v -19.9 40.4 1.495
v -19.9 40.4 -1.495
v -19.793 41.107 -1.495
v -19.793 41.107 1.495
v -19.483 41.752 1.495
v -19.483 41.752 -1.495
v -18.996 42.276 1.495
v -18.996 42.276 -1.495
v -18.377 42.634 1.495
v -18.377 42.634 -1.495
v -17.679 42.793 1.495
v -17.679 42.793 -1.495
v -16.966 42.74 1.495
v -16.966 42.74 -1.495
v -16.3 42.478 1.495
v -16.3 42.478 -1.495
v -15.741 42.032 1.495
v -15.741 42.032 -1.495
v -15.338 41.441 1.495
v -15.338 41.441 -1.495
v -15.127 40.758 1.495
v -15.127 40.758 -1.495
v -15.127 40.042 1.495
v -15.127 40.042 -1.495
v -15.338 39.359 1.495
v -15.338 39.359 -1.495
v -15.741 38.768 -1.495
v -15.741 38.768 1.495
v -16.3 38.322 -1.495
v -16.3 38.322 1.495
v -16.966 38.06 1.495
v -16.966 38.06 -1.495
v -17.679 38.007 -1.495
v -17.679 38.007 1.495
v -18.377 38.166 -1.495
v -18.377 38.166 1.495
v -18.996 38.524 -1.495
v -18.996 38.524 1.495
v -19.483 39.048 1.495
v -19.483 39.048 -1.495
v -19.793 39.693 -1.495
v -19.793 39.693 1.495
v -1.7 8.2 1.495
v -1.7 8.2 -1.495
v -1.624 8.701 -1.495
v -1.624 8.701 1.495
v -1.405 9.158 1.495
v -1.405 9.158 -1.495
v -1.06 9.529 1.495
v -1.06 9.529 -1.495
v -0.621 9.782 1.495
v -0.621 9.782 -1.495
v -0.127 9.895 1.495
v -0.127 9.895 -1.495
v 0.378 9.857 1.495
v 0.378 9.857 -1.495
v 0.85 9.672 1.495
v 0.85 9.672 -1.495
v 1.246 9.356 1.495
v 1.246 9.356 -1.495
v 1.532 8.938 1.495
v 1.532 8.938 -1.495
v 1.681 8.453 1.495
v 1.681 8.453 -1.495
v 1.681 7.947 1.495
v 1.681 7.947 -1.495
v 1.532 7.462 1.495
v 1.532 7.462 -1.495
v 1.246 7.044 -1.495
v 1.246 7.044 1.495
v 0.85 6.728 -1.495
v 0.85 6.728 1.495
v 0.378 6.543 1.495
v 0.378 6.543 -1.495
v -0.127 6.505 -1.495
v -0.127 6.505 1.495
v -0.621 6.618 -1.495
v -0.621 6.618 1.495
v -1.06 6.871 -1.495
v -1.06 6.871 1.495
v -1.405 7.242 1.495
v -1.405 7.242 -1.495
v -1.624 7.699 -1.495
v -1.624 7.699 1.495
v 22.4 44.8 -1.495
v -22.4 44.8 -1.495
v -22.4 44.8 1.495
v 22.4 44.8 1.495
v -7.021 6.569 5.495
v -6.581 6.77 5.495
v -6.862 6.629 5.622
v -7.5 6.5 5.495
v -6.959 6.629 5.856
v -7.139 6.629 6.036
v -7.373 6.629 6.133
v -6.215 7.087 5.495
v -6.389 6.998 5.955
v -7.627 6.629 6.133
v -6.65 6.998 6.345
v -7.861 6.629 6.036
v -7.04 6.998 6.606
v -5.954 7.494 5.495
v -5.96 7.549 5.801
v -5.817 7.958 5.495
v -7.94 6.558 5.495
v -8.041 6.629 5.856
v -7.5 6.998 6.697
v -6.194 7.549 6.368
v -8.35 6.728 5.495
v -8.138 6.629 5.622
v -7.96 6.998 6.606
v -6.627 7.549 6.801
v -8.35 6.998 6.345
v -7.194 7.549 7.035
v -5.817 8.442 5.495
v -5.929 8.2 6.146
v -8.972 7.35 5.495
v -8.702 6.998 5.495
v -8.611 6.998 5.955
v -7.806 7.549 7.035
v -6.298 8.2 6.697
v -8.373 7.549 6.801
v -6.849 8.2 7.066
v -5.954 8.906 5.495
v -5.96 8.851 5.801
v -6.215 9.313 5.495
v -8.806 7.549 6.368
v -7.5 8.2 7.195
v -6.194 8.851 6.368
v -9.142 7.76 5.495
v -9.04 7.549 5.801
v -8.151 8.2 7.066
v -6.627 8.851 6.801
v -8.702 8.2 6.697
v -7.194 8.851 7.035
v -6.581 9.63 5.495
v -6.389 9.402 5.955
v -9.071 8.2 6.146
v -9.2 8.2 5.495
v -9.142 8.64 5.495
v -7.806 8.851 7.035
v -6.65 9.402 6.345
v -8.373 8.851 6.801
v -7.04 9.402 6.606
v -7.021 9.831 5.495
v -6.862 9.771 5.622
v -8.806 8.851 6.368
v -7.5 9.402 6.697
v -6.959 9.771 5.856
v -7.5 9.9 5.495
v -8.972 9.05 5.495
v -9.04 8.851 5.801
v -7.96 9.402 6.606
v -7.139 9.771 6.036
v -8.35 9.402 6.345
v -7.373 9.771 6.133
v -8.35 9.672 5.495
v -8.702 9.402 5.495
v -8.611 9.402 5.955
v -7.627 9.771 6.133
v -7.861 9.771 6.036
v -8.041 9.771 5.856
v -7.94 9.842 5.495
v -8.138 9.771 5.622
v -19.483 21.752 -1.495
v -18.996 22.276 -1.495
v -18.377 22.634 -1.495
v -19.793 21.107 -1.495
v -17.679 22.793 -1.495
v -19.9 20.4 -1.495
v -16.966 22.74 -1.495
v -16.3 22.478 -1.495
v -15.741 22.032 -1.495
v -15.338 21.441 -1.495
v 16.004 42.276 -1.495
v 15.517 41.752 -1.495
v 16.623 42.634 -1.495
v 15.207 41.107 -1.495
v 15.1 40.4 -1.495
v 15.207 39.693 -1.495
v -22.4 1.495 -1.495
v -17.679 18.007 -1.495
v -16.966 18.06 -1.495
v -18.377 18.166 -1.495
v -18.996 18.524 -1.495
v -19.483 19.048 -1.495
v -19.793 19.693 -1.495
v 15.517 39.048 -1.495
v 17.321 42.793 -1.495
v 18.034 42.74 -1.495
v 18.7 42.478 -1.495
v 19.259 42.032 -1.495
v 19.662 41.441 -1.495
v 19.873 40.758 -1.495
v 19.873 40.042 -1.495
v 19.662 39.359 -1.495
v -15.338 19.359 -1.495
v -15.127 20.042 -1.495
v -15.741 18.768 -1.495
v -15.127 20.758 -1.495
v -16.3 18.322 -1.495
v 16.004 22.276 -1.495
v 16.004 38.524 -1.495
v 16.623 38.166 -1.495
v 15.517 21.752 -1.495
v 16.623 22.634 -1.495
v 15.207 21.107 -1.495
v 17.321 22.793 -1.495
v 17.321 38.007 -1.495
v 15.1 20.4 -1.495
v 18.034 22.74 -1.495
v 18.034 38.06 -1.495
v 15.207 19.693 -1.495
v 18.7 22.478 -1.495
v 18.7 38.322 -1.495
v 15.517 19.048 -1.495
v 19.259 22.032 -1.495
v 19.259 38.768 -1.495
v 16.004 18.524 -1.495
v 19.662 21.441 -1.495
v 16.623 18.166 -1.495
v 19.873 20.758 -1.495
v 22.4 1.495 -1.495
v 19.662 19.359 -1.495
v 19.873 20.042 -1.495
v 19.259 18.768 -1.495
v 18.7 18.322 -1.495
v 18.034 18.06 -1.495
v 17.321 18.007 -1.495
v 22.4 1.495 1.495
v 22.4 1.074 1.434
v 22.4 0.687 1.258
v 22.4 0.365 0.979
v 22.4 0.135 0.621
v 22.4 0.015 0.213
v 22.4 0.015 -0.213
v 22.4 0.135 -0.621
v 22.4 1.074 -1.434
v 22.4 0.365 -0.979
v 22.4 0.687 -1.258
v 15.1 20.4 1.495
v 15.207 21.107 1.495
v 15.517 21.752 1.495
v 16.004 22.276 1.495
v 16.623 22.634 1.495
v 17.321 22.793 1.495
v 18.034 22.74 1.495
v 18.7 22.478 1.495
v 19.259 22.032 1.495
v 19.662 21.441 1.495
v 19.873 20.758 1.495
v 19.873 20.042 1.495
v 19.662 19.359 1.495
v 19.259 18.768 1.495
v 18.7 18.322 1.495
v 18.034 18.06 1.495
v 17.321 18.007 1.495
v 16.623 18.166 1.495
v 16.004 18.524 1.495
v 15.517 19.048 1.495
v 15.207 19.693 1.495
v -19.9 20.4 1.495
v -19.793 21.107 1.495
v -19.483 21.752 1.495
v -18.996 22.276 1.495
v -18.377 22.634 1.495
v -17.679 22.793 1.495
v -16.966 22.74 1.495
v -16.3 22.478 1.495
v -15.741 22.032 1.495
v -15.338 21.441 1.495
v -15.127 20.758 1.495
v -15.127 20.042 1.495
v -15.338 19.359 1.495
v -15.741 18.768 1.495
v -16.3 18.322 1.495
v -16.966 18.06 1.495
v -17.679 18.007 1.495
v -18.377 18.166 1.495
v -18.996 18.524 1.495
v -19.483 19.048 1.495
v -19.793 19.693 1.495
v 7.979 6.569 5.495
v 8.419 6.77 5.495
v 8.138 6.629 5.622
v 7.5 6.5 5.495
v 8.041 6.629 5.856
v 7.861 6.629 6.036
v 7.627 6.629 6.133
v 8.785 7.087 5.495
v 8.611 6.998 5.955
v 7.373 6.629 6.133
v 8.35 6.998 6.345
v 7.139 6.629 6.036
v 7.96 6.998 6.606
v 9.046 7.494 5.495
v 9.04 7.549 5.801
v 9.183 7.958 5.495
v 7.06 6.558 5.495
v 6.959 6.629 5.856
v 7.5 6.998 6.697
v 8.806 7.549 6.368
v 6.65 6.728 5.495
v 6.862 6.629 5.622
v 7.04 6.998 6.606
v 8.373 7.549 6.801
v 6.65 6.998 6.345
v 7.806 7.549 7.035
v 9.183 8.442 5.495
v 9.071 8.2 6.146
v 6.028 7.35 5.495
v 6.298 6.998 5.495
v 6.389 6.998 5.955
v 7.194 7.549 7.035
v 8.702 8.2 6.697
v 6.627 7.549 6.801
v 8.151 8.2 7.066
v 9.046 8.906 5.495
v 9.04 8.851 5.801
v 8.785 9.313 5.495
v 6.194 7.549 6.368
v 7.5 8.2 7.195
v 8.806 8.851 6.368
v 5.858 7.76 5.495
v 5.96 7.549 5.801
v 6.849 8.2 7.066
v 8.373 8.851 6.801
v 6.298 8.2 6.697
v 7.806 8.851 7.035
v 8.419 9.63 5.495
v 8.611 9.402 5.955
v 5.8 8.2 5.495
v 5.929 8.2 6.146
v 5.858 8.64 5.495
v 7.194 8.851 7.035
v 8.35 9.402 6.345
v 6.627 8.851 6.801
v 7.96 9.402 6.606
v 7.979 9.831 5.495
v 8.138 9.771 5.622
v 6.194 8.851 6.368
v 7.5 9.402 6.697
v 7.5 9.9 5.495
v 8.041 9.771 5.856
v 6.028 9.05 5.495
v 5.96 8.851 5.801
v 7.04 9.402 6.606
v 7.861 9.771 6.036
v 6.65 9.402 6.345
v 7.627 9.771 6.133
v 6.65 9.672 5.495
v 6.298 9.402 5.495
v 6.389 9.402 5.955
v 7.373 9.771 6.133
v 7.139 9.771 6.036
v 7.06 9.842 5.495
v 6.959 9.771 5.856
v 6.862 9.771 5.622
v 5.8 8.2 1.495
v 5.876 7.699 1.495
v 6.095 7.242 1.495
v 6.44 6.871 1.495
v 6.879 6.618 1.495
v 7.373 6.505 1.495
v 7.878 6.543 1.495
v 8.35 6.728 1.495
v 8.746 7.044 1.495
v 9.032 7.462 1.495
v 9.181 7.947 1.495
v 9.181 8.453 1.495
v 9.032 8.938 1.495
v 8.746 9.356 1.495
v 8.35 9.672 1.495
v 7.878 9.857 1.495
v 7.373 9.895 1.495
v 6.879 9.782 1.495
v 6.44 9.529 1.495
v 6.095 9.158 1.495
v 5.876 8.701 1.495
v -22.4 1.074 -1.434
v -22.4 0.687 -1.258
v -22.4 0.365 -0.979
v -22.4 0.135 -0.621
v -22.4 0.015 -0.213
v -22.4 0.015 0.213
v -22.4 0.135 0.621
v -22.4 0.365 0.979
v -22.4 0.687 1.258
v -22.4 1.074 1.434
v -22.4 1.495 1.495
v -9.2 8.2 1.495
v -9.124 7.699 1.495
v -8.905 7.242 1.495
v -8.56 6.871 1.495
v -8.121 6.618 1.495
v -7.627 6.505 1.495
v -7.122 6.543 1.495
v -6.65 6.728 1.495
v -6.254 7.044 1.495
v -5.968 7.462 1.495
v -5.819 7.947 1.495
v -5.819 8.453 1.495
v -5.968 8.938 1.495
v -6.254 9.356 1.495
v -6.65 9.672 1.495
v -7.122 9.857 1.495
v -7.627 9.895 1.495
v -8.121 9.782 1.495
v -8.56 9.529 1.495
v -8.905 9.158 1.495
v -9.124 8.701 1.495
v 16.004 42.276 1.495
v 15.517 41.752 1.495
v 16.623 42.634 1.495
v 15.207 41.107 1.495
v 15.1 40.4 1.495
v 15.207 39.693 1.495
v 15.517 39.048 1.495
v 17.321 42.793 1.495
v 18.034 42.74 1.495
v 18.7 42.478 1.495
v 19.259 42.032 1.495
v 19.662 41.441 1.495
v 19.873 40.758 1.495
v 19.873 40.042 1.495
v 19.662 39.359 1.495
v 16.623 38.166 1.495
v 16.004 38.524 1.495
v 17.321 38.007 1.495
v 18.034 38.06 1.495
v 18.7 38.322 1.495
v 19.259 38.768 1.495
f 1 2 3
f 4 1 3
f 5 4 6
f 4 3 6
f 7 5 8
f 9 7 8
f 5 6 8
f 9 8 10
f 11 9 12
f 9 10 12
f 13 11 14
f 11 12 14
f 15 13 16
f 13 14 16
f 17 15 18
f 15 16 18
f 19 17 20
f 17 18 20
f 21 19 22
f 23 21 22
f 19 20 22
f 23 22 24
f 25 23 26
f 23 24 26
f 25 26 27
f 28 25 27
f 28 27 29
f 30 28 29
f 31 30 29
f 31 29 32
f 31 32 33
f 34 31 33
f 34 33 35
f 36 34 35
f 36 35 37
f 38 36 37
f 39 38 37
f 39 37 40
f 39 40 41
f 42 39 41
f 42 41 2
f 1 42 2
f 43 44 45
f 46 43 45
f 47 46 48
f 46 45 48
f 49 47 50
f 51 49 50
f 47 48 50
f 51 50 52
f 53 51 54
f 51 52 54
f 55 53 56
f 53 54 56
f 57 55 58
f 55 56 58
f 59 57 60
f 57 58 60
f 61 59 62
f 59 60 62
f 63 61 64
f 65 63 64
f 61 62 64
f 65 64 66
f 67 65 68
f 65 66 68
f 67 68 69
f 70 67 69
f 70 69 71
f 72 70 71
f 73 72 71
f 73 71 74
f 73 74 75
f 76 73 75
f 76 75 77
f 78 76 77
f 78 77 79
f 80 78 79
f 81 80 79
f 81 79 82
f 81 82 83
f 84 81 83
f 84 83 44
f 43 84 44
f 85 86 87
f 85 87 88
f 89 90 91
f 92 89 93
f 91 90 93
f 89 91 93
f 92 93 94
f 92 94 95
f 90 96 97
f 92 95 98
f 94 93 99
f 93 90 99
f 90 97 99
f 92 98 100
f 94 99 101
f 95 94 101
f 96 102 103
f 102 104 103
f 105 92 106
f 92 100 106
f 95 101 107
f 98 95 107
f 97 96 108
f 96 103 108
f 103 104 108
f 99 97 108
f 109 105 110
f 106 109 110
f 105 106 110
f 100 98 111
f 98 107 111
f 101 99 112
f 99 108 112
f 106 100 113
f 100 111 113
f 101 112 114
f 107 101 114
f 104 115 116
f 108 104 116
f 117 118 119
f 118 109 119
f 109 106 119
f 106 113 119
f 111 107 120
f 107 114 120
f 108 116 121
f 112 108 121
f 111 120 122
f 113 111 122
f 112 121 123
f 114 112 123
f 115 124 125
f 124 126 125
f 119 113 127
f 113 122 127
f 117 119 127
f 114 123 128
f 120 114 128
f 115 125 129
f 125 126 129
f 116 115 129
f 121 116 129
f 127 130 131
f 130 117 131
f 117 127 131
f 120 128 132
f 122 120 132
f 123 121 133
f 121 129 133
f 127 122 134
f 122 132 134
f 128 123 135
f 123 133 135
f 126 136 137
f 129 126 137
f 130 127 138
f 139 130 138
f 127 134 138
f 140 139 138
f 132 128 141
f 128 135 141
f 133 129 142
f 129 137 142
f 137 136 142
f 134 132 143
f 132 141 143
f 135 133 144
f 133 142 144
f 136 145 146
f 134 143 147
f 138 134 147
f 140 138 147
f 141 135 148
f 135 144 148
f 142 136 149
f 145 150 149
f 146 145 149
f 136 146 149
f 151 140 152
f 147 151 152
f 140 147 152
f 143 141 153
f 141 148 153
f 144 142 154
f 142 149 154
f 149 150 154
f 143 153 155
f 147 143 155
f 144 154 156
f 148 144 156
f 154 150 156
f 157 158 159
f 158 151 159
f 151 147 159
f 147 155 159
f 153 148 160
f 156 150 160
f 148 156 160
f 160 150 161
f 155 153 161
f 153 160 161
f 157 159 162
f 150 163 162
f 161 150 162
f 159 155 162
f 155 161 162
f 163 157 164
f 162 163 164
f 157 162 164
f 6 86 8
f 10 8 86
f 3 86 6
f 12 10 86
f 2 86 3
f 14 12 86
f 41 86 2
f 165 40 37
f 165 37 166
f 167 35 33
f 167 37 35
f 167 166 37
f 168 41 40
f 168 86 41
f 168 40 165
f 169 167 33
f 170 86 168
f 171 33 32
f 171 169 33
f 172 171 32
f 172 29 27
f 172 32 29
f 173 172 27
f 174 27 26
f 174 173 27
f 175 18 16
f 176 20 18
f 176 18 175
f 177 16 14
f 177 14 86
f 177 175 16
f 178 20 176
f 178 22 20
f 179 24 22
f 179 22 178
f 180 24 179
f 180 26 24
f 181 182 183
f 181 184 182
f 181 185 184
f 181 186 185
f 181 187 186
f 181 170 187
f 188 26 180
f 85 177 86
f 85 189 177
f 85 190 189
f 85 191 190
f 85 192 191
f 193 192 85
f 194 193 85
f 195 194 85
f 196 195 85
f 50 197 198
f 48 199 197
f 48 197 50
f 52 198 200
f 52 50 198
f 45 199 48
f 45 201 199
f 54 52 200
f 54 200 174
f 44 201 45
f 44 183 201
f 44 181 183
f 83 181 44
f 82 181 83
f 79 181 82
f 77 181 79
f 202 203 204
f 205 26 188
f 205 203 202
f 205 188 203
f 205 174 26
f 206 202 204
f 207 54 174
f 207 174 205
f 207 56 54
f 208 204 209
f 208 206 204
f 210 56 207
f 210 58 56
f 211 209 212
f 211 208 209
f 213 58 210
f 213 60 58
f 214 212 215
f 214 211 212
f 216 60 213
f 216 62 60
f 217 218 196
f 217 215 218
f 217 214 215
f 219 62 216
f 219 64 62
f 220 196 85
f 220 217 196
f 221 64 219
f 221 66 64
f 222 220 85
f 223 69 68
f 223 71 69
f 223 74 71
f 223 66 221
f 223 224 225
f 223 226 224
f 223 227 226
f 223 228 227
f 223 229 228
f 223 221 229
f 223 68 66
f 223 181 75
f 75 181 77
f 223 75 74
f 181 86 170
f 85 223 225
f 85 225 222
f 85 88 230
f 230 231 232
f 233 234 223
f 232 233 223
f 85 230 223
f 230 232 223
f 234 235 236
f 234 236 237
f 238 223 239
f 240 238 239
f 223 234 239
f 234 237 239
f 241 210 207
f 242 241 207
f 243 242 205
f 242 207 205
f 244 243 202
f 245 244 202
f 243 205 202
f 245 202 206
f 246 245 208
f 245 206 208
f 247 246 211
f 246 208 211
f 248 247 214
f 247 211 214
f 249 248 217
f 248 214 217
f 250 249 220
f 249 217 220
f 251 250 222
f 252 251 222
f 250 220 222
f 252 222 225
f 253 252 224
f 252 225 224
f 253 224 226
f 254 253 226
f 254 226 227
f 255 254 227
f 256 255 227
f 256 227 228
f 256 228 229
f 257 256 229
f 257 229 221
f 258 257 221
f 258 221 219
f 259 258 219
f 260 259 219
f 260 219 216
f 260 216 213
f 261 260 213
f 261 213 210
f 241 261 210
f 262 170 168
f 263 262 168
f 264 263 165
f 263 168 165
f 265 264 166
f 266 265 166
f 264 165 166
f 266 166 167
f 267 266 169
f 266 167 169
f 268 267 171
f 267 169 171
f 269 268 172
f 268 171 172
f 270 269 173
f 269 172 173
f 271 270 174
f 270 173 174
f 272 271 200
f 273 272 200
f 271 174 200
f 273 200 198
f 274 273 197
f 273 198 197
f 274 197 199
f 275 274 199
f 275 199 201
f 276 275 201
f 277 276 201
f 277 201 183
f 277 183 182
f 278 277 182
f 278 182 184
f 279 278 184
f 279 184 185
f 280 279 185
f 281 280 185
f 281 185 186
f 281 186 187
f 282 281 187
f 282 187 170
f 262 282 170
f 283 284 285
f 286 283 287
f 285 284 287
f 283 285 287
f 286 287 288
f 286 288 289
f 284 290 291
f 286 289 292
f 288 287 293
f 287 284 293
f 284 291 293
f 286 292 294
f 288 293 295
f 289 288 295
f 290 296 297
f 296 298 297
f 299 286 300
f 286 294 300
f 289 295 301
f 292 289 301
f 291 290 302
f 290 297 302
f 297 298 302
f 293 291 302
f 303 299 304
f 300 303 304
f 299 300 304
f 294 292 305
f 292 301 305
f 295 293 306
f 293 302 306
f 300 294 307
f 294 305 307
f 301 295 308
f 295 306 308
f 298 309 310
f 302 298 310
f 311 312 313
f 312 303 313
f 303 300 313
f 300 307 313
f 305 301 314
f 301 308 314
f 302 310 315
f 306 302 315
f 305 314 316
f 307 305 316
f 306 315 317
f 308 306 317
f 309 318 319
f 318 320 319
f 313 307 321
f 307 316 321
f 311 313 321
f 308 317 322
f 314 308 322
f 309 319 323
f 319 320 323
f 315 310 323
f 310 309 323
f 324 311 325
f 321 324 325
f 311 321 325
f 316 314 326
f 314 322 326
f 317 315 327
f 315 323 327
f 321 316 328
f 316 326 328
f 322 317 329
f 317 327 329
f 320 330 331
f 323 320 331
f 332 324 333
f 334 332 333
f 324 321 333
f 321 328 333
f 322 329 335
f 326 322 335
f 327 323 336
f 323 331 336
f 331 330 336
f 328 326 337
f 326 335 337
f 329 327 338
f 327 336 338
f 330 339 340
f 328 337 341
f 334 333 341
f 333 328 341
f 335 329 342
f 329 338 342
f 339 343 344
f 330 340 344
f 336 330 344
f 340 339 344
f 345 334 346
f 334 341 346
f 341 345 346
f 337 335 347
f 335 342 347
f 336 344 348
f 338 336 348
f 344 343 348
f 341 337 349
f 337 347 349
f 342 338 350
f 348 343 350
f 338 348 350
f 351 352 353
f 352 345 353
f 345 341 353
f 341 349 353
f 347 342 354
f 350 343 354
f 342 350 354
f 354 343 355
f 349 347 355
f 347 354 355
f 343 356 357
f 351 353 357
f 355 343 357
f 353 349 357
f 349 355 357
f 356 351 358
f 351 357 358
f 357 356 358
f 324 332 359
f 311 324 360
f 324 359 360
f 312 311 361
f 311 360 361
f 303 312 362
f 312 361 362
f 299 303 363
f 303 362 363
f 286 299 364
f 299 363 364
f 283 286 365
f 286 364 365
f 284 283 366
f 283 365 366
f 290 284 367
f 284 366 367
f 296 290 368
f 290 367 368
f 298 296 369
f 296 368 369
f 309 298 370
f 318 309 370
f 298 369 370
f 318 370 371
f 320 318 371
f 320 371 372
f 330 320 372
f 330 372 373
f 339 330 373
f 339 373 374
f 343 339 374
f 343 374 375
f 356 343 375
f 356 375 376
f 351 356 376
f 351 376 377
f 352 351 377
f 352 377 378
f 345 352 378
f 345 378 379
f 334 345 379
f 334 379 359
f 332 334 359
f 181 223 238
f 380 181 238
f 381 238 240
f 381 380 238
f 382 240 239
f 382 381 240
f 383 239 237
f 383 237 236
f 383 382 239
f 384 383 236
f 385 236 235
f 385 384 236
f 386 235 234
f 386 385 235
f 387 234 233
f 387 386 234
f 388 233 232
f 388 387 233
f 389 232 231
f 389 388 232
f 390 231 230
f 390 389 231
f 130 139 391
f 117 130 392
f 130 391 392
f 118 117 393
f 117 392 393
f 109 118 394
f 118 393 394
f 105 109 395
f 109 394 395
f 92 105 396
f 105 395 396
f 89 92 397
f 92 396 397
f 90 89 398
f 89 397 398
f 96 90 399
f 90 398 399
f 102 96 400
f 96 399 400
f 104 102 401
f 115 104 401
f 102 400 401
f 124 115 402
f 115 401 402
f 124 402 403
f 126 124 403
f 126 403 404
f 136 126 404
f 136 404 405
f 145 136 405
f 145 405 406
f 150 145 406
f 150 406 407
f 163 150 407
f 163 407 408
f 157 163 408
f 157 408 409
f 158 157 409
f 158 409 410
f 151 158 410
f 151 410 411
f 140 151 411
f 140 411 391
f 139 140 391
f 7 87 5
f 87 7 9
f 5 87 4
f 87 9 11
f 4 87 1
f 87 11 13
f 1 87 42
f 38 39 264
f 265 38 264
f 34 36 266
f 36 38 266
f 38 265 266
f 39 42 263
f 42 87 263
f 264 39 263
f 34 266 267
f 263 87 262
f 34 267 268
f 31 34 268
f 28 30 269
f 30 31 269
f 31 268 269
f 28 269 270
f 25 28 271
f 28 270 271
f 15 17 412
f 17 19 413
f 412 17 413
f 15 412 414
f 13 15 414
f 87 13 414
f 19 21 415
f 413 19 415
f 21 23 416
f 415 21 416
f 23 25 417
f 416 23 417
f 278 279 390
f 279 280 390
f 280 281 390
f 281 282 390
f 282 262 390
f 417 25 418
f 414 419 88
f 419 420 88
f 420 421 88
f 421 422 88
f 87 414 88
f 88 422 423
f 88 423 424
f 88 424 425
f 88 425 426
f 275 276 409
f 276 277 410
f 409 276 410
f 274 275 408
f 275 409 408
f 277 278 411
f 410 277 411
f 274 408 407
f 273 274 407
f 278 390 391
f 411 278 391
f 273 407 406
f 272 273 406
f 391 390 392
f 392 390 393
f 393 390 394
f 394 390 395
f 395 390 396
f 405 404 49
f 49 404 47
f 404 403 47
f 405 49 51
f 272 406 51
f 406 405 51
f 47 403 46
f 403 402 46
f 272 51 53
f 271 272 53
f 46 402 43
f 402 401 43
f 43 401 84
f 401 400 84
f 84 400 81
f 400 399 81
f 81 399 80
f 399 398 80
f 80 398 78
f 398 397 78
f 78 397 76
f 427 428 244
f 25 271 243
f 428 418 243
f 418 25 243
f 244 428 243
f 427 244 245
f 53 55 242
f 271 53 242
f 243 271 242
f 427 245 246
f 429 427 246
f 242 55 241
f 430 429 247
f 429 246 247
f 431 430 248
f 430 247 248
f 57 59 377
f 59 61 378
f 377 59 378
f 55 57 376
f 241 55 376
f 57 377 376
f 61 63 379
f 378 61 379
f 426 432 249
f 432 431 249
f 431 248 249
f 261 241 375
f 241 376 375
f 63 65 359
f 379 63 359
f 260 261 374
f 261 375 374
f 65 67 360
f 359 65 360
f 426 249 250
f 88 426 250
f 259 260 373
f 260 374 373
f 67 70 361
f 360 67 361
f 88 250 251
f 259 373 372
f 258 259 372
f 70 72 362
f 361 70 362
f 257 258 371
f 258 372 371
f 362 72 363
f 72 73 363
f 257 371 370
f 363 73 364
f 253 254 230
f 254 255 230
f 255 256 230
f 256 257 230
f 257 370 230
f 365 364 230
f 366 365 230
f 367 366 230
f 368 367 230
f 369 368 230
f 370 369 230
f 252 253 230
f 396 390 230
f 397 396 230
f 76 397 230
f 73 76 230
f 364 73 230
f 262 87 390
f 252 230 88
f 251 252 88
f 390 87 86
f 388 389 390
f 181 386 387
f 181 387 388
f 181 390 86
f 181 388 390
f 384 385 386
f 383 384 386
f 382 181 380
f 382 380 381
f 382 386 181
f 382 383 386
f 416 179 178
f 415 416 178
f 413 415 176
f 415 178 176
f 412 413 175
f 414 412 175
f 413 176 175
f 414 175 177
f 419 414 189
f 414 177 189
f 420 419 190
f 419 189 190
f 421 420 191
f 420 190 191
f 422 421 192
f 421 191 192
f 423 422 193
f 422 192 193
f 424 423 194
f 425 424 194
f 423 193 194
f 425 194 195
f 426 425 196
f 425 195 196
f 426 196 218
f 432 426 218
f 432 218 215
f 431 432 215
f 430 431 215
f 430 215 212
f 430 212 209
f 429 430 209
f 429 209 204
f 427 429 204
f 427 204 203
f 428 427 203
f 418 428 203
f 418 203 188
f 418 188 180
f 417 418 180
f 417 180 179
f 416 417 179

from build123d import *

# Parameters (mm, degrees)
SKETCH1_W            = 44.8
SKETCH1_H            = 2.99
BOSS_EXTRUDE1_DEPTH  = 44.8
FILLET1_RADIUS       = 1.495
FILLET1_LENGTH       = 44.8
M4_CLEARANCE_HOLE1_D = 4.8
M3_CLEARANCE_HOLE1_D = 3.4
SKETCH8_R            = 1.7
BOSS_EXTRUDE2_DEPTH  = 4
REVOLVE1_ANGLE       = 180
REVOLVE2_ANGLE       = 180


with BuildPart() as part:
    # Sketch1 → Boss-Extrude1 (new body)
    with BuildSketch(Plane(origin=(0, 0, 0), x_dir=(1, 0, 0), z_dir=(0, 1, 0))):
        Rectangle(SKETCH1_W, SKETCH1_H)
    extrude(amount=BOSS_EXTRUDE1_DEPTH)

    # Fillet1: full round fillet: the end face becomes a half cylinder, R = half its width
    fillet1_face = Plane((0, 0, 0), x_dir=(-1, 0, 0), z_dir=(0, -1, 0))  # on the end face: x along it, z out of the body
    fillet1_slab = fillet1_face.offset(-FILLET1_RADIUS / 2) * Box(FILLET1_LENGTH, 2 * FILLET1_RADIUS, FILLET1_RADIUS, mode=Mode.PRIVATE)  # the body's end, R deep
    fillet1_round = Plane((0, 1.495, 0), x_dir=(0, -1, 0), z_dir=(-1, 0, 0)) * Cylinder(FILLET1_RADIUS, FILLET1_LENGTH, mode=Mode.PRIVATE)  # its axis R under the face
    add(fillet1_slab - fillet1_round, mode=Mode.SUBTRACT)

    # M4 Clearance Hole1 (through all)
    with Locations(Plane.XY.offset(1.495)):
        with Locations((-17.5, 40.4), (-17.5, 20.4), (17.5, 20.4), (17.5, 40.4)):
            Hole(M4_CLEARANCE_HOLE1_D / 2)

    # M3 Clearance Hole1 (through all)
    with Locations(Plane.XY.offset(1.495)):
        with Locations((0, 8.2)):
            Hole(M3_CLEARANCE_HOLE1_D / 2)

    # Sketch8 → Boss-Extrude2 (add)
    with BuildSketch(Plane.XY.offset(1.495)):
        with Locations(Location((-7.5, 8.2, 0), (0, 0, 180))):
            Circle(SKETCH8_R)
        with Locations(Location((7.5, 8.2, 0), (0, 0, 180))):
            Circle(SKETCH8_R)
    extrude(amount=BOSS_EXTRUDE2_DEPTH)

    # Sketch9 → Revolve1 (revolve)
    with BuildSketch(Plane.XY.offset(5.495)):
        with BuildLine():
            Line((-7.5, 9.9), (-7.5, 6.5))
            ThreePointArc((-7.5, 6.5), (-5.8, 8.2), (-7.5, 9.9))
        make_face()
    revolve(axis=Axis((-7.5, 9.9, 5.495), (0, -1, 0)), revolution_arc=REVOLVE1_ANGLE)

    # Sketch10 → Revolve2 (revolve)
    with BuildSketch(Plane.XY.offset(5.495)):
        with BuildLine():
            Line((7.5, 9.9), (7.5, 6.5))
            ThreePointArc((7.5, 6.5), (9.2, 8.2), (7.5, 9.9))
        make_face()
    revolve(axis=Axis((7.5, 9.9, 5.495), (0, -1, 0)), revolution_arc=REVOLVE2_ANGLE)


solid = part.part
